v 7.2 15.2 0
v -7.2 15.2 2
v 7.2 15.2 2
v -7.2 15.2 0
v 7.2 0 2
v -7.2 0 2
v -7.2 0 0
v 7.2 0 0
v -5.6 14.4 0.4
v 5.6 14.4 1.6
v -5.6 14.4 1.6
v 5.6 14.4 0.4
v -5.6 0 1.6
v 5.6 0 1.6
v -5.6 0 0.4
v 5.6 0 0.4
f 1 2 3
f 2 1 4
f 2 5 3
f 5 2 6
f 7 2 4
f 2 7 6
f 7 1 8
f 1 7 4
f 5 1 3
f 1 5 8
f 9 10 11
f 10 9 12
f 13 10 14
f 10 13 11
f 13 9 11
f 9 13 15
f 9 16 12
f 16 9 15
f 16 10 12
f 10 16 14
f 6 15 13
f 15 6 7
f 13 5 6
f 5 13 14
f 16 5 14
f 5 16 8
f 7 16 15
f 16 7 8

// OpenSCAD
// file: ../p/4-4edge.scad
use <../lib.scad>
$fa=1; $fs=0.2;
function ldraw_lib__4_4edge(realsolid=false) = [
// 0 Circle 1.0
// 0 Name: 4-4edge.dat
// 0 Author: James Jessiman
// 0 !LDRAW_ORG Primitive UPDATE 2017-01
// 0 !LICENSE Licensed under CC BY 2.0 and CC BY 4.0 : see CAreadme.txt
// 
// 0 BFC CERTIFY CCW
  [0,"BFC","CERTIFY"],
  [0,"BFC","CCW"],
// 
// 0 !HISTORY 1998-12-15 [PTadmin] Official Update 1998-10
// 0 !HISTORY 2005-12-28 [PTadmin] Official Update 2005-01
// 0 !HISTORY 2007-06-24 [PTadmin] Header formatted for Contributor Agreement
// 0 !HISTORY 2008-07-01 [PTadmin] Official Update 2008-01
// 0 !HISTORY 2017-01-15 [Steffen] BFCed
// 0 !HISTORY 2017-12-30 [PTadmin] Official Update 2017-01
// 
// 
// 2 24 1 0 0 0.9239 0 0.3827
  [2,24,1,0,0,0.9239,0,0.3827],
// 2 24 0.9239 0 0.3827 0.7071 0 0.7071
  [2,24,0.9239,0,0.3827,0.7071,0,0.7071],
// 2 24 0.7071 0 0.7071 0.3827 0 0.9239
  [2,24,0.7071,0,0.7071,0.3827,0,0.9239],
// 2 24 0.3827 0 0.9239 0 0 1
  [2,24,0.3827,0,0.9239,0,0,1],
// 2 24 0 0 1 -0.3827 0 0.9239
  [2,24,0,0,1,-0.3827,0,0.9239],
// 2 24 -0.3827 0 0.9239 -0.7071 0 0.7071
  [2,24,-0.3827,0,0.9239,-0.7071,0,0.7071],
// 2 24 -0.7071 0 0.7071 -0.9239 0 0.3827
  [2,24,-0.7071,0,0.7071,-0.9239,0,0.3827],
// 2 24 -0.9239 0 0.3827 -1 0 -0
  [2,24,-0.9239,0,0.3827,-1,0,-0],
// 2 24 -1 0 -0 -0.9239 0 -0.3827
  [2,24,-1,0,-0,-0.9239,0,-0.3827],
// 2 24 -0.9239 0 -0.3827 -0.7071 0 -0.7071
  [2,24,-0.9239,0,-0.3827,-0.7071,0,-0.7071],
// 2 24 -0.7071 0 -0.7071 -0.3827 0 -0.9239
  [2,24,-0.7071,0,-0.7071,-0.3827,0,-0.9239],
// 2 24 -0.3827 0 -0.9239 0 0 -1
  [2,24,-0.3827,0,-0.9239,0,0,-1],
// 2 24 0 0 -1 0.3827 0 -0.9239
  [2,24,0,0,-1,0.3827,0,-0.9239],
// 2 24 0.3827 0 -0.9239 0.7071 0 -0.7071
  [2,24,0.3827,0,-0.9239,0.7071,0,-0.7071],
// 2 24 0.7071 0 -0.7071 0.9239 0 -0.3827
  [2,24,0.7071,0,-0.7071,0.9239,0,-0.3827],
// 2 24 0.9239 0 -0.3827 1 0 0
  [2,24,0.9239,0,-0.3827,1,0,0],
];
module ldraw_lib__4_4edge(step=0, col=false, unit=2/5, alt=false, line=0.2, solid=!$preview)
    makepoly(ldraw_lib__4_4edge(solid), step=step, col=col, unit=unit, alt=alt, line=line, solid=solid);
ldraw_lib__4_4edge(line=0.2);
// file: ../p/4-4disc.scad
use <../lib.scad>
$fa=1; $fs=0.2;
function ldraw_lib__4_4disc(realsolid=false) = [
// 0 Disc 1.0
// 0 Name: 4-4disc.dat
// 0 Author: James Jessiman
// 0 !LDRAW_ORG Primitive UPDATE 2002-02
// 0 !LICENSE Licensed under CC BY 2.0 and CC BY 4.0 : see CAreadme.txt
// 
// 0 BFC CERTIFY CCW
  [0,"BFC","CERTIFY"],
  [0,"BFC","CCW"],
// 
// 0 !HISTORY 1998-12-15 [PTadmin] Official Update 1998-10
// 0 !HISTORY 2002-03-23 [sbliss] Added BFC statement
// 0 !HISTORY 2002-04-25 [PTadmin] Official Update 2002-02
// 0 !HISTORY 2007-06-24 [PTadmin] Header formatted for Contributor Agreement
// 0 !HISTORY 2008-07-01 [PTadmin] Official Update 2008-01
// 
// 
// 3 16 0 0 0 1 0 0 0.9239 0 0.3827
  [3,16,0,0,0,1,0,0,0.9239,0,0.3827],
// 3 16 0 0 0 0.9239 0 0.3827 0.7071 0 0.7071
  [3,16,0,0,0,0.9239,0,0.3827,0.7071,0,0.7071],
// 3 16 0 0 0 0.7071 0 0.7071 0.3827 0 0.9239
  [3,16,0,0,0,0.7071,0,0.7071,0.3827,0,0.9239],
// 3 16 0 0 0 0.3827 0 0.9239 0 0 1
  [3,16,0,0,0,0.3827,0,0.9239,0,0,1],
// 3 16 0 0 0 0 0 1 -0.3827 0 0.9239
  [3,16,0,0,0,0,0,1,-0.3827,0,0.9239],
// 3 16 0 0 0 -0.3827 0 0.9239 -0.7071 0 0.7071
  [3,16,0,0,0,-0.3827,0,0.9239,-0.7071,0,0.7071],
// 3 16 0 0 0 -0.7071 0 0.7071 -0.9239 0 0.3827
  [3,16,0,0,0,-0.7071,0,0.7071,-0.9239,0,0.3827],
// 3 16 0 0 0 -0.9239 0 0.3827 -1 0 -0
  [3,16,0,0,0,-0.9239,0,0.3827,-1,0,-0],
// 3 16 0 0 0 -1 0 -0 -0.9239 0 -0.3827
  [3,16,0,0,0,-1,0,-0,-0.9239,0,-0.3827],
// 3 16 0 0 0 -0.9239 0 -0.3827 -0.7071 0 -0.7071
  [3,16,0,0,0,-0.9239,0,-0.3827,-0.7071,0,-0.7071],
// 3 16 0 0 0 -0.7071 0 -0.7071 -0.3827 0 -0.9239
  [3,16,0,0,0,-0.7071,0,-0.7071,-0.3827,0,-0.9239],
// 3 16 0 0 0 -0.3827 0 -0.9239 0 0 -1
  [3,16,0,0,0,-0.3827,0,-0.9239,0,0,-1],
// 3 16 0 0 0 0 0 -1 0.3827 0 -0.9239
  [3,16,0,0,0,0,0,-1,0.3827,0,-0.9239],
// 3 16 0 0 0 0.3827 0 -0.9239 0.7071 0 -0.7071
  [3,16,0,0,0,0.3827,0,-0.9239,0.7071,0,-0.7071],
// 3 16 0 0 0 0.7071 0 -0.7071 0.9239 0 -0.3827
  [3,16,0,0,0,0.7071,0,-0.7071,0.9239,0,-0.3827],
// 3 16 0 0 0 0.9239 0 -0.3827 1 0 0
  [3,16,0,0,0,0.9239,0,-0.3827,1,0,0],
// 0
];
module ldraw_lib__4_4disc(step=0, col=false, unit=2/5, alt=false, line=0.2, solid=!$preview)
    makepoly(ldraw_lib__4_4disc(solid), step=step, col=col, unit=unit, alt=alt, line=line, solid=solid);
ldraw_lib__4_4disc(line=0.2);
// file: ../p/4-4cyli.scad
use <../lib.scad>
$fa=1; $fs=0.2;
function ldraw_lib__4_4cyli(realsolid=false) = [
// 0 Cylinder 1.0
// 0 Name: 4-4cyli.dat
// 0 Author: James Jessiman
// 0 !LDRAW_ORG Primitive UPDATE 2005-01
// 0 !LICENSE Licensed under CC BY 2.0 and CC BY 4.0 : see CAreadme.txt
// 
// 0 BFC CERTIFY CCW
  [0,"BFC","CERTIFY"],
  [0,"BFC","CCW"],
// 
// 0 !HISTORY 1998-12-15 [PTadmin] Official Update 1998-10
// 0 !HISTORY 2002-03-23 [sbliss] Added BFC statement; merged headers from files in distributions LDraw 0.27 and Complete.
// 0 !HISTORY 2002-04-25 [PTadmin] Official Update 2002-02
// 0 !HISTORY 2004-12-14 [guyvivan] BFC CCW
// 0 !HISTORY 2005-12-28 [PTadmin] Official Update 2005-01
// 0 !HISTORY 2007-06-24 [PTadmin] Header formatted for Contributor Agreement
// 0 !HISTORY 2008-07-01 [PTadmin] Official Update 2008-01
// 
// 
// 4 16 1 1 0 0.9239 1 0.3827 0.9239 0 0.3827 1 0 0
  [4,16,1,1,0,0.9239,1,0.3827,0.9239,0,0.3827,1,0,0],
// 5 24 1 0 0 1 1 0 0.9239 0 0.3827 0.9239 0 -0.3827
  [5,24,1,0,0,1,1,0,0.9239,0,0.3827,0.9239,0,-0.3827],
// 4 16 0.9239 1 0.3827 0.7071 1 0.7071 0.7071 0 0.7071 0.9239 0 0.3827
  [4,16,0.9239,1,0.3827,0.7071,1,0.7071,0.7071,0,0.7071,0.9239,0,0.3827],
// 5 24 0.9239 0 0.3827 0.9239 1 0.3827 0.7071 0 0.7071 1 0 0
  [5,24,0.9239,0,0.3827,0.9239,1,0.3827,0.7071,0,0.7071,1,0,0],
// 4 16 0.7071 1 0.7071 0.3827 1 0.9239 0.3827 0 0.9239 0.7071 0 0.7071
  [4,16,0.7071,1,0.7071,0.3827,1,0.9239,0.3827,0,0.9239,0.7071,0,0.7071],
// 5 24 0.7071 0 0.7071 0.7071 1 0.7071 0.3827 0 0.9239 0.9239 0 0.3827
  [5,24,0.7071,0,0.7071,0.7071,1,0.7071,0.3827,0,0.9239,0.9239,0,0.3827],
// 4 16 0.3827 1 0.9239 0 1 1 0 0 1 0.3827 0 0.9239
  [4,16,0.3827,1,0.9239,0,1,1,0,0,1,0.3827,0,0.9239],
// 5 24 0.3827 0 0.9239 0.3827 1 0.9239 0 0 1 0.7071 0 0.7071
  [5,24,0.3827,0,0.9239,0.3827,1,0.9239,0,0,1,0.7071,0,0.7071],
// 4 16 0 1 1 -0.3827 1 0.9239 -0.3827 0 0.9239 0 0 1
  [4,16,0,1,1,-0.3827,1,0.9239,-0.3827,0,0.9239,0,0,1],
// 5 24 0 0 1 0 1 1 -0.3827 0 0.9239 0.3827 0 0.9239
  [5,24,0,0,1,0,1,1,-0.3827,0,0.9239,0.3827,0,0.9239],
// 4 16 -0.3827 1 0.9239 -0.7071 1 0.7071 -0.7071 0 0.7071 -0.3827 0 0.9239
  [4,16,-0.3827,1,0.9239,-0.7071,1,0.7071,-0.7071,0,0.7071,-0.3827,0,0.9239],
// 5 24 -0.3827 0 0.9239 -0.3827 1 0.9239 -0.7071 0 0.7071 0 0 1
  [5,24,-0.3827,0,0.9239,-0.3827,1,0.9239,-0.7071,0,0.7071,0,0,1],
// 4 16 -0.7071 1 0.7071 -0.9239 1 0.3827 -0.9239 0 0.3827 -0.7071 0 0.7071
  [4,16,-0.7071,1,0.7071,-0.9239,1,0.3827,-0.9239,0,0.3827,-0.7071,0,0.7071],
// 5 24 -0.7071 0 0.7071 -0.7071 1 0.7071 -0.9239 0 0.3827 -0.3827 0 0.9239
  [5,24,-0.7071,0,0.7071,-0.7071,1,0.7071,-0.9239,0,0.3827,-0.3827,0,0.9239],
// 4 16 -0.9239 1 0.3827 -1 1 0 -1 0 0 -0.9239 0 0.3827
  [4,16,-0.9239,1,0.3827,-1,1,0,-1,0,0,-0.9239,0,0.3827],
// 5 24 -0.9239 0 0.3827 -0.9239 1 0.3827 -1 0 0 -0.7071 0 0.7071
  [5,24,-0.9239,0,0.3827,-0.9239,1,0.3827,-1,0,0,-0.7071,0,0.7071],
// 4 16 -1 1 0 -0.9239 1 -0.3827 -0.9239 0 -0.3827 -1 0 0
  [4,16,-1,1,0,-0.9239,1,-0.3827,-0.9239,0,-0.3827,-1,0,0],
// 5 24 -1 0 0 -1 1 0 -0.9239 0 -0.3827 -0.9239 0 0.3827
  [5,24,-1,0,0,-1,1,0,-0.9239,0,-0.3827,-0.9239,0,0.3827],
// 4 16 -0.9239 1 -0.3827 -0.7071 1 -0.7071 -0.7071 0 -0.7071 -0.9239 0 -0.3827
  [4,16,-0.9239,1,-0.3827,-0.7071,1,-0.7071,-0.7071,0,-0.7071,-0.9239,0,-0.3827],
// 5 24 -0.9239 0 -0.3827 -0.9239 1 -0.3827 -0.7071 0 -0.7071 -1 0 0
  [5,24,-0.9239,0,-0.3827,-0.9239,1,-0.3827,-0.7071,0,-0.7071,-1,0,0],
// 4 16 -0.7071 1 -0.7071 -0.3827 1 -0.9239 -0.3827 0 -0.9239 -0.7071 0 -0.7071
  [4,16,-0.7071,1,-0.7071,-0.3827,1,-0.9239,-0.3827,0,-0.9239,-0.7071,0,-0.7071],
// 5 24 -0.7071 0 -0.7071 -0.7071 1 -0.7071 -0.3827 0 -0.9239 -0.9239 0 -0.3827
  [5,24,-0.7071,0,-0.7071,-0.7071,1,-0.7071,-0.3827,0,-0.9239,-0.9239,0,-0.3827],
// 4 16 -0.3827 1 -0.9239 0 1 -1 0 0 -1 -0.3827 0 -0.9239
  [4,16,-0.3827,1,-0.9239,0,1,-1,0,0,-1,-0.3827,0,-0.9239],
// 5 24 -0.3827 0 -0.9239 -0.3827 1 -0.9239 0 0 -1 -0.7071 0 -0.7071
  [5,24,-0.3827,0,-0.9239,-0.3827,1,-0.9239,0,0,-1,-0.7071,0,-0.7071],
// 4 16 0 1 -1 0.3827 1 -0.9239 0.3827 0 -0.9239 0 0 -1
  [4,16,0,1,-1,0.3827,1,-0.9239,0.3827,0,-0.9239,0,0,-1],
// 5 24 0 0 -1 0 1 -1 0.3827 0 -0.9239 -0.3827 0 -0.9239
  [5,24,0,0,-1,0,1,-1,0.3827,0,-0.9239,-0.3827,0,-0.9239],
// 4 16 0.3827 1 -0.9239 0.7071 1 -0.7071 0.7071 0 -0.7071 0.3827 0 -0.9239
  [4,16,0.3827,1,-0.9239,0.7071,1,-0.7071,0.7071,0,-0.7071,0.3827,0,-0.9239],
// 5 24 0.3827 0 -0.9239 0.3827 1 -0.9239 0.7071 0 -0.7071 0 0 -1
  [5,24,0.3827,0,-0.9239,0.3827,1,-0.9239,0.7071,0,-0.7071,0,0,-1],
// 4 16 0.7071 1 -0.7071 0.9239 1 -0.3827 0.9239 0 -0.3827 0.7071 0 -0.7071
  [4,16,0.7071,1,-0.7071,0.9239,1,-0.3827,0.9239,0,-0.3827,0.7071,0,-0.7071],
// 5 24 0.7071 0 -0.7071 0.7071 1 -0.7071 0.9239 0 -0.3827 0.3827 0 -0.9239
  [5,24,0.7071,0,-0.7071,0.7071,1,-0.7071,0.9239,0,-0.3827,0.3827,0,-0.9239],
// 4 16 0.9239 1 -0.3827 1 1 0 1 0 0 0.9239 0 -0.3827
  [4,16,0.9239,1,-0.3827,1,1,0,1,0,0,0.9239,0,-0.3827],
// 5 24 0.9239 0 -0.3827 0.9239 1 -0.3827 1 0 0 0.7071 0 -0.7071
  [5,24,0.9239,0,-0.3827,0.9239,1,-0.3827,1,0,0,0.7071,0,-0.7071],
// 0
];
module ldraw_lib__4_4cyli(step=0, col=false, unit=2/5, alt=false, line=0.2, solid=!$preview)
    makepoly(ldraw_lib__4_4cyli(solid), step=step, col=col, unit=unit, alt=alt, line=line, solid=solid);
ldraw_lib__4_4cyli(line=0.2);
// file: ../p/stud3.scad
use <../lib.scad>
use <4-4cyli.scad>
use <4-4disc.scad>
use <4-4edge.scad>
$fa=1; $fs=0.2;
function ldraw_lib__stud3(realsolid=false) = realsolid ? 
    [openscad(translate([0,0,-eps()], o=cylinder(4+eps(), r=4)),2)] : [
// 0 Stud Tube Solid
// 0 Name: stud3.dat
// 0 Author: James Jessiman
// 0 !LDRAW_ORG Primitive UPDATE 2012-01
// 0 !LICENSE Licensed under CC BY 2.0 and CC BY 4.0 : see CAreadme.txt
// 
// 0 BFC CERTIFY CCW
  [0,"BFC","CERTIFY"],
  [0,"BFC","CCW"],
// 
// 0 !HISTORY 2002-04-04 [sbliss] Modified for BFC compliance
// 0 !HISTORY 2002-04-25 [PTadmin] Official Update 2002-02
// 0 !HISTORY 2007-06-24 [PTadmin] Header formatted for Contributor Agreement
// 0 !HISTORY 2008-07-01 [PTadmin] Official Update 2008-01
// 0 !HISTORY 2012-02-16 [Philo] Changed to CCW
// 0 !HISTORY 2012-03-30 [PTadmin] Official Update 2012-01
// 
// 
// 1 16 0 -4 0 4 0 0 0 1 0 0 0 4 4-4edge.dat
  [1,16,0,-4,0,4,0,0,0,1,0,0,0,4, ldraw_lib__4_4edge(realsolid)],
// 1 16 0 0 0 4 0 0 0 1 0 0 0 4 4-4edge.dat
  [1,16,0,0,0,4,0,0,0,1,0,0,0,4, ldraw_lib__4_4edge(realsolid)],
// 1 16 0 -4 0 4 0 0 0 1 0 0 0 4 4-4disc.dat
  [1,16,0,-4,0,4,0,0,0,1,0,0,0,4, ldraw_lib__4_4disc(realsolid)],
// 1 16 0 -4 0 4 0 0 0 4 0 0 0 4 4-4cyli.dat
  [1,16,0,-4,0,4,0,0,0,4,0,0,0,4, ldraw_lib__4_4cyli(realsolid)],
];
module ldraw_lib__stud3(step=0, col=false, unit=2/5, alt=false, line=0.2, solid=!$preview)
    makepoly(ldraw_lib__stud3(solid), step=step, col=col, unit=unit, alt=alt, line=line, solid=solid);
ldraw_lib__stud3(line=0.2);
// file: ../p/stud.scad
use <../lib.scad>
use <4-4cyli.scad>
use <4-4disc.scad>
use <4-4edge.scad>
$fa=1; $fs=0.2;
function ldraw_lib__stud(realsolid=false) = realsolid ? 
    [openscad(translate([0,0,-eps()], o=cylinder(4+eps(), r=6)),2)] : [
// 0 Stud
// 0 Name: stud.dat
// 0 Author: James Jessiman
// 0 !LDRAW_ORG Primitive UPDATE 2012-01
// 0 !LICENSE Licensed under CC BY 2.0 and CC BY 4.0 : see CAreadme.txt
// 
// 0 BFC CERTIFY CCW
  [0,"BFC","CERTIFY"],
  [0,"BFC","CCW"],
// 
// 0 !HISTORY 2002-04-04 [sbliss] Modified for BFC compliance
// 0 !HISTORY 2002-04-25 [PTadmin] Official Update 2002-02
// 0 !HISTORY 2007-06-24 [PTadmin] Header formatted for Contributor Agreement
// 0 !HISTORY 2008-07-01 [PTadmin] Official Update 2008-01
// 0 !HISTORY 2012-02-16 [Philo] Changed to CCW
// 0 !HISTORY 2012-03-30 [PTadmin] Official Update 2012-01
// 
// 
// 1 16 0 0 0 6 0 0 0 1 0 0 0 6 4-4edge.dat
  [1,16,0,0,0,6,0,0,0,1,0,0,0,6, ldraw_lib__4_4edge(realsolid)],
// 1 16 0 -4 0 6 0 0 0 1 0 0 0 6 4-4edge.dat
  [1,16,0,-4,0,6,0,0,0,1,0,0,0,6, ldraw_lib__4_4edge(realsolid)],
// 1 16 0 0 0 6 0 0 0 -4 0 0 0 6 4-4cyli.dat
  [1,16,0,0,0,6,0,0,0,-4,0,0,0,6, ldraw_lib__4_4cyli(realsolid)],
// 1 16 0 -4 0 6 0 0 0 1 0 0 0 6 4-4disc.dat
  [1,16,0,-4,0,6,0,0,0,1,0,0,0,6, ldraw_lib__4_4disc(realsolid)],
];
module ldraw_lib__stud(step=0, col=false, unit=2/5, alt=false, line=0.2, solid=!$preview)
    makepoly(ldraw_lib__stud(solid), step=step, col=col, unit=unit, alt=alt, line=line, solid=solid);
ldraw_lib__stud(line=0.2);
// file: ../p/box4t.scad
use <../lib.scad>
$fa=1; $fs=0.2;
function ldraw_lib__box4t(realsolid=false) = [
// 0 Box with 4 Adjacent Faces and All Edges
// 0 Name: box4t.dat
// 0 Author: Tore Eriksson [Tore_Eriksson]
// 0 !LDRAW_ORG Primitive UPDATE 2003-02
// 0 !LICENSE Licensed under CC BY 2.0 and CC BY 4.0 : see CAreadme.txt
// 
// 0 BFC CERTIFY CCW
  [0,"BFC","CERTIFY"],
  [0,"BFC","CCW"],
// 
// 0 !HISTORY 1997-09-29 [PTadmin] Official Update 1997-15
// 0 !HISTORY 2002-08-31 [izanette] Modified with WINDZ for BFC compliance
// 0 !HISTORY 2003-08-01 [PTadmin] Official Update 2003-02
// 0 !HISTORY 2007-06-24 [PTadmin] Header formatted for Contributor Agreement
// 0 !HISTORY 2008-07-01 [PTadmin] Official Update 2008-01
// 
// 
// 2 24 1 1 1 -1 1 1
  [2,24,1,1,1,-1,1,1],
// 2 24 -1 1 1 -1 1 -1
  [2,24,-1,1,1,-1,1,-1],
// 2 24 -1 1 -1 1 1 -1
  [2,24,-1,1,-1,1,1,-1],
// 2 24 1 1 -1 1 1 1
  [2,24,1,1,-1,1,1,1],
// 2 24 1 0 1 -1 0 1
  [2,24,1,0,1,-1,0,1],
// 2 24 -1 0 1 -1 0 -1
  [2,24,-1,0,1,-1,0,-1],
// 2 24 -1 0 -1 1 0 -1
  [2,24,-1,0,-1,1,0,-1],
// 2 24 1 0 -1 1 0 1
  [2,24,1,0,-1,1,0,1],
// 2 24 1 0 1 1 1 1
  [2,24,1,0,1,1,1,1],
// 2 24 -1 0 1 -1 1 1
  [2,24,-1,0,1,-1,1,1],
// 2 24 1 0 -1 1 1 -1
  [2,24,1,0,-1,1,1,-1],
// 2 24 -1 0 -1 -1 1 -1
  [2,24,-1,0,-1,-1,1,-1],
// 4 16 1 1 1 1 1 -1 -1 1 -1 -1 1 1
  [4,16,1,1,1,1,1,-1,-1,1,-1,-1,1,1],
// 4 16 1 1 1 -1 1 1 -1 0 1 1 0 1
  [4,16,1,1,1,-1,1,1,-1,0,1,1,0,1],
// 4 16 -1 1 1 -1 1 -1 -1 0 -1 -1 0 1
  [4,16,-1,1,1,-1,1,-1,-1,0,-1,-1,0,1],
// 0 4 16 -1 1 -1 -1 0 -1 1 0 -1 1 1 -1
// 4 16 1 1 -1 1 1 1 1 0 1 1 0 -1
  [4,16,1,1,-1,1,1,1,1,0,1,1,0,-1],
// 0
];
module ldraw_lib__box4t(step=0, col=false, unit=2/5, alt=false, line=0.2, solid=!$preview)
    makepoly(ldraw_lib__box4t(solid), step=step, col=col, unit=unit, alt=alt, line=line, solid=solid);
ldraw_lib__box4t(line=0.2);
// file: s/3004s01.scad
use <../../lib.scad>
use <../../p/box4t.scad>
use <../../p/box5.scad>
use <../../p/stud.scad>
use <../../p/stud3.scad>
$fa=1; $fs=0.2;
function ldraw_lib__s__3004s01(realsolid=false) = [
// 0 ~Brick  1 x  2 without Front Face
// 0 Name: s\3004s01.dat
// 0 Author: James Jessiman
// 0 !LDRAW_ORG Subpart UPDATE 2003-03
// 0 !LICENSE Licensed under CC BY 2.0 and CC BY 4.0 : see CAreadme.txt
// 
// 0 BFC CERTIFY CCW
  [0,"BFC","CERTIFY"],
  [0,"BFC","CCW"],
// 
// 0 !HISTORY 2003-09-07 [jriley] Subfiling, BFC
// 0 !HISTORY 2003-12-19 [PTadmin] Official Update 2003-03
// 0 !HISTORY 2007-08-29 [PTadmin] Header formatted for Contributor Agreement
// 0 !HISTORY 2008-07-01 [PTadmin] Official Update 2008-01
// 
// 
// 1 16 0 4 0 1 0 0 0 -5 0 0 0 1 stud3.dat
  [1,16,0,4,0,1,0,0,0,-5,0,0,0,1, ldraw_lib__stud3(realsolid)],
// 0 BFC INVERTNEXT
  [0,"BFC","INVERTNEXT"],
// 1 16 0 24 0 16 0 0 0 -20 0 0 0 6 box5.dat
  [1,16,0,24,0,16,0,0,0,-20,0,0,0,6, ldraw_lib__box5(realsolid)],
// 4 16 20 24 10 16 24 6 -16 24 6 -20 24 10
  [4,16,20,24,10,16,24,6,-16,24,6,-20,24,10],
// 4 16 -20 24 10 -16 24 6 -16 24 -6 -20 24 -10
  [4,16,-20,24,10,-16,24,6,-16,24,-6,-20,24,-10],
// 4 16 -20 24 -10 -16 24 -6 16 24 -6 20 24 -10
  [4,16,-20,24,-10,-16,24,-6,16,24,-6,20,24,-10],
// 4 16 20 24 -10 16 24 -6 16 24 6 20 24 10
  [4,16,20,24,-10,16,24,-6,16,24,6,20,24,10],
// 1 16 0 24 0 20 0 0 0 -24 0 0 0 10 box4t.dat
  [1,16,0,24,0,20,0,0,0,-24,0,0,0,10, ldraw_lib__box4t(realsolid)],
// 1 16 10 0 0 1 0 0 0 1 0 0 0 1 stud.dat
  [1,16,10,0,0,1,0,0,0,1,0,0,0,1, ldraw_lib__stud(realsolid)],
// 1 16 -10 0 0 1 0 0 0 1 0 0 0 1 stud.dat
  [1,16,-10,0,0,1,0,0,0,1,0,0,0,1, ldraw_lib__stud(realsolid)],
// 0
];
module ldraw_lib__s__3004s01(step=0, col=false, unit=2/5, alt=false, line=0.2, solid=!$preview)
    makepoly(ldraw_lib__s__3004s01(solid), step=step, col=col, unit=unit, alt=alt, line=line, solid=solid);
ldraw_lib__s__3004s01(line=0.2);
// file: 3004.scad
use <../lib.scad>
use <s/3004s01.scad>
$fa=1; $fs=0.2;
function ldraw_lib__3004(realsolid=false) = [
// 0 Brick  1 x  2
// 0 Name: 3004.dat
// 0 Author: James Jessiman
// 0 !LDRAW_ORG Part UPDATE 2022-05
// 0 !LICENSE Licensed under CC BY 2.0 and CC BY 4.0 : see CAreadme.txt
// 
// 0 BFC CERTIFY CCW
  [0,"BFC","CERTIFY"],
  [0,"BFC","CCW"],
// 
// 0 !HISTORY 2001-10-26 [PTadmin] Official Update 2001-01
// 0 !HISTORY 2002-05-07 {unknown} BFC Certification
// 0 !HISTORY 2002-06-11 [PTadmin] Official Update 2002-03
// 0 !HISTORY 2007-05-07 [PTadmin] Header formatted for Contributor Agreement
// 0 !HISTORY 2008-07-01 [PTadmin] Official Update 2008-01
// 0 !HISTORY 2022-08-04 [MagFors] Using subfile
// 0 !HISTORY 2022-09-15 [PTadmin] Official Update 2022-05
// 
// 
// 1 16 0 0 0 1 0 0 0 1 0 0 0 1 s\3004s01.dat
  [1,16,0,0,0,1,0,0,0,1,0,0,0,1, ldraw_lib__s__3004s01(realsolid)],
// 4 16 -20 24 -10 20 24 -10 20 0 -10 -20 0 -10
  [4,16,-20,24,-10,20,24,-10,20,0,-10,-20,0,-10],
];
module ldraw_lib__3004(step=0, col=false, unit=2/5, alt=false, line=0.2, solid=!$preview)
    makepoly(ldraw_lib__3004(solid), step=step, col=col, unit=unit, alt=alt, line=line, solid=solid);
ldraw_lib__3004(line=0.2);
// file: ../p/box5.scad
use <../lib.scad>
$fa=1; $fs=0.2;
function ldraw_lib__box5(realsolid=false) = [
// 0 Box with 5 Faces and All Edges
// 0 Name: box5.dat
// 0 Author: James Jessiman
// 0 !LDRAW_ORG Primitive UPDATE 2012-01
// 0 !LICENSE Licensed under CC BY 2.0 and CC BY 4.0 : see CAreadme.txt
// 
// 0 BFC CERTIFY CCW
  [0,"BFC","CERTIFY"],
  [0,"BFC","CCW"],
// 
// 0 !HISTORY 2002-04-03 [sbliss] Modified for BFC compliance
// 0 !HISTORY 2002-04-25 [PTadmin] Official Update 2002-02
// 0 !HISTORY 2007-06-24 [PTadmin] Header formatted for Contributor Agreement
// 0 !HISTORY 2008-07-01 [PTadmin] Official Update 2008-01
// 0 !HISTORY 2012-02-16 [Philo] Changed to CCW
// 0 !HISTORY 2012-03-30 [PTadmin] Official Update 2012-01
// 
// 
// 2 24 1 1 1 -1 1 1
  [2,24,1,1,1,-1,1,1],
// 2 24 -1 1 1 -1 1 -1
  [2,24,-1,1,1,-1,1,-1],
// 2 24 -1 1 -1 1 1 -1
  [2,24,-1,1,-1,1,1,-1],
// 2 24 1 1 -1 1 1 1
  [2,24,1,1,-1,1,1,1],
// 2 24 1 0 1 -1 0 1
  [2,24,1,0,1,-1,0,1],
// 2 24 -1 0 1 -1 0 -1
  [2,24,-1,0,1,-1,0,-1],
// 2 24 -1 0 -1 1 0 -1
  [2,24,-1,0,-1,1,0,-1],
// 2 24 1 0 -1 1 0 1
  [2,24,1,0,-1,1,0,1],
// 2 24 1 0 1 1 1 1
  [2,24,1,0,1,1,1,1],
// 2 24 -1 0 1 -1 1 1
  [2,24,-1,0,1,-1,1,1],
// 2 24 1 0 -1 1 1 -1
  [2,24,1,0,-1,1,1,-1],
// 2 24 -1 0 -1 -1 1 -1
  [2,24,-1,0,-1,-1,1,-1],
// 4 16 -1 1 1 1 1 1 1 1 -1 -1 1 -1
  [4,16,-1,1,1,1,1,1,1,1,-1,-1,1,-1],
// 4 16 -1 1 1 -1 0 1 1 0 1 1 1 1
  [4,16,-1,1,1,-1,0,1,1,0,1,1,1,1],
// 4 16 -1 1 -1 -1 0 -1 -1 0 1 -1 1 1
  [4,16,-1,1,-1,-1,0,-1,-1,0,1,-1,1,1],
// 4 16 1 1 -1 1 0 -1 -1 0 -1 -1 1 -1
  [4,16,1,1,-1,1,0,-1,-1,0,-1,-1,1,-1],
// 4 16 1 1 1 1 0 1 1 0 -1 1 1 -1
  [4,16,1,1,1,1,0,1,1,0,-1,1,1,-1],
];
module ldraw_lib__box5(step=0, col=false, unit=2/5, alt=false, line=0.2, solid=!$preview)
    makepoly(ldraw_lib__box5(solid), step=step, col=col, unit=unit, alt=alt, line=line, solid=solid);
ldraw_lib__box5(line=0.2);
// main file
use <../lib.scad>
use <../p/box5.scad>
$fa=1; $fs=0.2;
function ldraw_lib__11034(realsolid=false) = [
// 0 ~Electric Mindstorms EV3 SD-card Connector
// 0 Name: 11034.dat
// 0 Author: Philippe Hurbain [Philo]
// 0 !LDRAW_ORG Part UPDATE 2013-02
// 0 !LICENSE Licensed under CC BY 2.0 and CC BY 4.0 : see CAreadme.txt
// 
// 0 BFC CERTIFY CCW
  [0,"BFC","CERTIFY"],
  [0,"BFC","CCW"],
// 
// 0 !HISTORY 2012-05-20 {LEGO MINDSTORMS Team} Original part shape
// 0 !HISTORY 2012-12-10 [Philo] Complete rebuild for LDraw Parts Tracker
// 0 !HISTORY 2013-12-23 [PTadmin] Official Update 2013-02
// 
// 
// 1 16 0 -2.5 0 18 0 0 0 0 -2.5 0 38 0 box5.dat
  [1,16,0,-2.5,0,18,0,0,0,0,-2.5,0,38,0, ldraw_lib__box5(realsolid)],
// 0 BFC INVERTNEXT
  [0,"BFC","INVERTNEXT"],
// 1 16 0 -2.5 0 14 0 0 0 0 -1.5 0 36 0 box5.dat
  [1,16,0,-2.5,0,14,0,0,0,0,-1.5,0,36,0, ldraw_lib__box5(realsolid)],
// 4 16 -18 0 0 -14 -1 0 -14 -4 0 -18 -5 0
  [4,16,-18,0,0,-14,-1,0,-14,-4,0,-18,-5,0],
// 4 16 -18 -5 0 -14 -4 0 14 -4 0 18 -5 0
  [4,16,-18,-5,0,-14,-4,0,14,-4,0,18,-5,0],
// 4 16 18 -5 0 14 -4 0 14 -1 0 18 0 0
  [4,16,18,-5,0,14,-4,0,14,-1,0,18,0,0],
// 4 16 18 0 0 14 -1 0 -14 -1 0 -18 0 0
  [4,16,18,0,0,14,-1,0,-14,-1,0,-18,0,0],
];
module ldraw_lib__11034(step=0, col=false, unit=2/5, alt=false, line=0.2, solid=!$preview)
    makepoly(ldraw_lib__11034(solid), step=step, col=col, unit=unit, alt=alt, line=line, solid=solid);
ldraw_lib__11034(line=0.2);
